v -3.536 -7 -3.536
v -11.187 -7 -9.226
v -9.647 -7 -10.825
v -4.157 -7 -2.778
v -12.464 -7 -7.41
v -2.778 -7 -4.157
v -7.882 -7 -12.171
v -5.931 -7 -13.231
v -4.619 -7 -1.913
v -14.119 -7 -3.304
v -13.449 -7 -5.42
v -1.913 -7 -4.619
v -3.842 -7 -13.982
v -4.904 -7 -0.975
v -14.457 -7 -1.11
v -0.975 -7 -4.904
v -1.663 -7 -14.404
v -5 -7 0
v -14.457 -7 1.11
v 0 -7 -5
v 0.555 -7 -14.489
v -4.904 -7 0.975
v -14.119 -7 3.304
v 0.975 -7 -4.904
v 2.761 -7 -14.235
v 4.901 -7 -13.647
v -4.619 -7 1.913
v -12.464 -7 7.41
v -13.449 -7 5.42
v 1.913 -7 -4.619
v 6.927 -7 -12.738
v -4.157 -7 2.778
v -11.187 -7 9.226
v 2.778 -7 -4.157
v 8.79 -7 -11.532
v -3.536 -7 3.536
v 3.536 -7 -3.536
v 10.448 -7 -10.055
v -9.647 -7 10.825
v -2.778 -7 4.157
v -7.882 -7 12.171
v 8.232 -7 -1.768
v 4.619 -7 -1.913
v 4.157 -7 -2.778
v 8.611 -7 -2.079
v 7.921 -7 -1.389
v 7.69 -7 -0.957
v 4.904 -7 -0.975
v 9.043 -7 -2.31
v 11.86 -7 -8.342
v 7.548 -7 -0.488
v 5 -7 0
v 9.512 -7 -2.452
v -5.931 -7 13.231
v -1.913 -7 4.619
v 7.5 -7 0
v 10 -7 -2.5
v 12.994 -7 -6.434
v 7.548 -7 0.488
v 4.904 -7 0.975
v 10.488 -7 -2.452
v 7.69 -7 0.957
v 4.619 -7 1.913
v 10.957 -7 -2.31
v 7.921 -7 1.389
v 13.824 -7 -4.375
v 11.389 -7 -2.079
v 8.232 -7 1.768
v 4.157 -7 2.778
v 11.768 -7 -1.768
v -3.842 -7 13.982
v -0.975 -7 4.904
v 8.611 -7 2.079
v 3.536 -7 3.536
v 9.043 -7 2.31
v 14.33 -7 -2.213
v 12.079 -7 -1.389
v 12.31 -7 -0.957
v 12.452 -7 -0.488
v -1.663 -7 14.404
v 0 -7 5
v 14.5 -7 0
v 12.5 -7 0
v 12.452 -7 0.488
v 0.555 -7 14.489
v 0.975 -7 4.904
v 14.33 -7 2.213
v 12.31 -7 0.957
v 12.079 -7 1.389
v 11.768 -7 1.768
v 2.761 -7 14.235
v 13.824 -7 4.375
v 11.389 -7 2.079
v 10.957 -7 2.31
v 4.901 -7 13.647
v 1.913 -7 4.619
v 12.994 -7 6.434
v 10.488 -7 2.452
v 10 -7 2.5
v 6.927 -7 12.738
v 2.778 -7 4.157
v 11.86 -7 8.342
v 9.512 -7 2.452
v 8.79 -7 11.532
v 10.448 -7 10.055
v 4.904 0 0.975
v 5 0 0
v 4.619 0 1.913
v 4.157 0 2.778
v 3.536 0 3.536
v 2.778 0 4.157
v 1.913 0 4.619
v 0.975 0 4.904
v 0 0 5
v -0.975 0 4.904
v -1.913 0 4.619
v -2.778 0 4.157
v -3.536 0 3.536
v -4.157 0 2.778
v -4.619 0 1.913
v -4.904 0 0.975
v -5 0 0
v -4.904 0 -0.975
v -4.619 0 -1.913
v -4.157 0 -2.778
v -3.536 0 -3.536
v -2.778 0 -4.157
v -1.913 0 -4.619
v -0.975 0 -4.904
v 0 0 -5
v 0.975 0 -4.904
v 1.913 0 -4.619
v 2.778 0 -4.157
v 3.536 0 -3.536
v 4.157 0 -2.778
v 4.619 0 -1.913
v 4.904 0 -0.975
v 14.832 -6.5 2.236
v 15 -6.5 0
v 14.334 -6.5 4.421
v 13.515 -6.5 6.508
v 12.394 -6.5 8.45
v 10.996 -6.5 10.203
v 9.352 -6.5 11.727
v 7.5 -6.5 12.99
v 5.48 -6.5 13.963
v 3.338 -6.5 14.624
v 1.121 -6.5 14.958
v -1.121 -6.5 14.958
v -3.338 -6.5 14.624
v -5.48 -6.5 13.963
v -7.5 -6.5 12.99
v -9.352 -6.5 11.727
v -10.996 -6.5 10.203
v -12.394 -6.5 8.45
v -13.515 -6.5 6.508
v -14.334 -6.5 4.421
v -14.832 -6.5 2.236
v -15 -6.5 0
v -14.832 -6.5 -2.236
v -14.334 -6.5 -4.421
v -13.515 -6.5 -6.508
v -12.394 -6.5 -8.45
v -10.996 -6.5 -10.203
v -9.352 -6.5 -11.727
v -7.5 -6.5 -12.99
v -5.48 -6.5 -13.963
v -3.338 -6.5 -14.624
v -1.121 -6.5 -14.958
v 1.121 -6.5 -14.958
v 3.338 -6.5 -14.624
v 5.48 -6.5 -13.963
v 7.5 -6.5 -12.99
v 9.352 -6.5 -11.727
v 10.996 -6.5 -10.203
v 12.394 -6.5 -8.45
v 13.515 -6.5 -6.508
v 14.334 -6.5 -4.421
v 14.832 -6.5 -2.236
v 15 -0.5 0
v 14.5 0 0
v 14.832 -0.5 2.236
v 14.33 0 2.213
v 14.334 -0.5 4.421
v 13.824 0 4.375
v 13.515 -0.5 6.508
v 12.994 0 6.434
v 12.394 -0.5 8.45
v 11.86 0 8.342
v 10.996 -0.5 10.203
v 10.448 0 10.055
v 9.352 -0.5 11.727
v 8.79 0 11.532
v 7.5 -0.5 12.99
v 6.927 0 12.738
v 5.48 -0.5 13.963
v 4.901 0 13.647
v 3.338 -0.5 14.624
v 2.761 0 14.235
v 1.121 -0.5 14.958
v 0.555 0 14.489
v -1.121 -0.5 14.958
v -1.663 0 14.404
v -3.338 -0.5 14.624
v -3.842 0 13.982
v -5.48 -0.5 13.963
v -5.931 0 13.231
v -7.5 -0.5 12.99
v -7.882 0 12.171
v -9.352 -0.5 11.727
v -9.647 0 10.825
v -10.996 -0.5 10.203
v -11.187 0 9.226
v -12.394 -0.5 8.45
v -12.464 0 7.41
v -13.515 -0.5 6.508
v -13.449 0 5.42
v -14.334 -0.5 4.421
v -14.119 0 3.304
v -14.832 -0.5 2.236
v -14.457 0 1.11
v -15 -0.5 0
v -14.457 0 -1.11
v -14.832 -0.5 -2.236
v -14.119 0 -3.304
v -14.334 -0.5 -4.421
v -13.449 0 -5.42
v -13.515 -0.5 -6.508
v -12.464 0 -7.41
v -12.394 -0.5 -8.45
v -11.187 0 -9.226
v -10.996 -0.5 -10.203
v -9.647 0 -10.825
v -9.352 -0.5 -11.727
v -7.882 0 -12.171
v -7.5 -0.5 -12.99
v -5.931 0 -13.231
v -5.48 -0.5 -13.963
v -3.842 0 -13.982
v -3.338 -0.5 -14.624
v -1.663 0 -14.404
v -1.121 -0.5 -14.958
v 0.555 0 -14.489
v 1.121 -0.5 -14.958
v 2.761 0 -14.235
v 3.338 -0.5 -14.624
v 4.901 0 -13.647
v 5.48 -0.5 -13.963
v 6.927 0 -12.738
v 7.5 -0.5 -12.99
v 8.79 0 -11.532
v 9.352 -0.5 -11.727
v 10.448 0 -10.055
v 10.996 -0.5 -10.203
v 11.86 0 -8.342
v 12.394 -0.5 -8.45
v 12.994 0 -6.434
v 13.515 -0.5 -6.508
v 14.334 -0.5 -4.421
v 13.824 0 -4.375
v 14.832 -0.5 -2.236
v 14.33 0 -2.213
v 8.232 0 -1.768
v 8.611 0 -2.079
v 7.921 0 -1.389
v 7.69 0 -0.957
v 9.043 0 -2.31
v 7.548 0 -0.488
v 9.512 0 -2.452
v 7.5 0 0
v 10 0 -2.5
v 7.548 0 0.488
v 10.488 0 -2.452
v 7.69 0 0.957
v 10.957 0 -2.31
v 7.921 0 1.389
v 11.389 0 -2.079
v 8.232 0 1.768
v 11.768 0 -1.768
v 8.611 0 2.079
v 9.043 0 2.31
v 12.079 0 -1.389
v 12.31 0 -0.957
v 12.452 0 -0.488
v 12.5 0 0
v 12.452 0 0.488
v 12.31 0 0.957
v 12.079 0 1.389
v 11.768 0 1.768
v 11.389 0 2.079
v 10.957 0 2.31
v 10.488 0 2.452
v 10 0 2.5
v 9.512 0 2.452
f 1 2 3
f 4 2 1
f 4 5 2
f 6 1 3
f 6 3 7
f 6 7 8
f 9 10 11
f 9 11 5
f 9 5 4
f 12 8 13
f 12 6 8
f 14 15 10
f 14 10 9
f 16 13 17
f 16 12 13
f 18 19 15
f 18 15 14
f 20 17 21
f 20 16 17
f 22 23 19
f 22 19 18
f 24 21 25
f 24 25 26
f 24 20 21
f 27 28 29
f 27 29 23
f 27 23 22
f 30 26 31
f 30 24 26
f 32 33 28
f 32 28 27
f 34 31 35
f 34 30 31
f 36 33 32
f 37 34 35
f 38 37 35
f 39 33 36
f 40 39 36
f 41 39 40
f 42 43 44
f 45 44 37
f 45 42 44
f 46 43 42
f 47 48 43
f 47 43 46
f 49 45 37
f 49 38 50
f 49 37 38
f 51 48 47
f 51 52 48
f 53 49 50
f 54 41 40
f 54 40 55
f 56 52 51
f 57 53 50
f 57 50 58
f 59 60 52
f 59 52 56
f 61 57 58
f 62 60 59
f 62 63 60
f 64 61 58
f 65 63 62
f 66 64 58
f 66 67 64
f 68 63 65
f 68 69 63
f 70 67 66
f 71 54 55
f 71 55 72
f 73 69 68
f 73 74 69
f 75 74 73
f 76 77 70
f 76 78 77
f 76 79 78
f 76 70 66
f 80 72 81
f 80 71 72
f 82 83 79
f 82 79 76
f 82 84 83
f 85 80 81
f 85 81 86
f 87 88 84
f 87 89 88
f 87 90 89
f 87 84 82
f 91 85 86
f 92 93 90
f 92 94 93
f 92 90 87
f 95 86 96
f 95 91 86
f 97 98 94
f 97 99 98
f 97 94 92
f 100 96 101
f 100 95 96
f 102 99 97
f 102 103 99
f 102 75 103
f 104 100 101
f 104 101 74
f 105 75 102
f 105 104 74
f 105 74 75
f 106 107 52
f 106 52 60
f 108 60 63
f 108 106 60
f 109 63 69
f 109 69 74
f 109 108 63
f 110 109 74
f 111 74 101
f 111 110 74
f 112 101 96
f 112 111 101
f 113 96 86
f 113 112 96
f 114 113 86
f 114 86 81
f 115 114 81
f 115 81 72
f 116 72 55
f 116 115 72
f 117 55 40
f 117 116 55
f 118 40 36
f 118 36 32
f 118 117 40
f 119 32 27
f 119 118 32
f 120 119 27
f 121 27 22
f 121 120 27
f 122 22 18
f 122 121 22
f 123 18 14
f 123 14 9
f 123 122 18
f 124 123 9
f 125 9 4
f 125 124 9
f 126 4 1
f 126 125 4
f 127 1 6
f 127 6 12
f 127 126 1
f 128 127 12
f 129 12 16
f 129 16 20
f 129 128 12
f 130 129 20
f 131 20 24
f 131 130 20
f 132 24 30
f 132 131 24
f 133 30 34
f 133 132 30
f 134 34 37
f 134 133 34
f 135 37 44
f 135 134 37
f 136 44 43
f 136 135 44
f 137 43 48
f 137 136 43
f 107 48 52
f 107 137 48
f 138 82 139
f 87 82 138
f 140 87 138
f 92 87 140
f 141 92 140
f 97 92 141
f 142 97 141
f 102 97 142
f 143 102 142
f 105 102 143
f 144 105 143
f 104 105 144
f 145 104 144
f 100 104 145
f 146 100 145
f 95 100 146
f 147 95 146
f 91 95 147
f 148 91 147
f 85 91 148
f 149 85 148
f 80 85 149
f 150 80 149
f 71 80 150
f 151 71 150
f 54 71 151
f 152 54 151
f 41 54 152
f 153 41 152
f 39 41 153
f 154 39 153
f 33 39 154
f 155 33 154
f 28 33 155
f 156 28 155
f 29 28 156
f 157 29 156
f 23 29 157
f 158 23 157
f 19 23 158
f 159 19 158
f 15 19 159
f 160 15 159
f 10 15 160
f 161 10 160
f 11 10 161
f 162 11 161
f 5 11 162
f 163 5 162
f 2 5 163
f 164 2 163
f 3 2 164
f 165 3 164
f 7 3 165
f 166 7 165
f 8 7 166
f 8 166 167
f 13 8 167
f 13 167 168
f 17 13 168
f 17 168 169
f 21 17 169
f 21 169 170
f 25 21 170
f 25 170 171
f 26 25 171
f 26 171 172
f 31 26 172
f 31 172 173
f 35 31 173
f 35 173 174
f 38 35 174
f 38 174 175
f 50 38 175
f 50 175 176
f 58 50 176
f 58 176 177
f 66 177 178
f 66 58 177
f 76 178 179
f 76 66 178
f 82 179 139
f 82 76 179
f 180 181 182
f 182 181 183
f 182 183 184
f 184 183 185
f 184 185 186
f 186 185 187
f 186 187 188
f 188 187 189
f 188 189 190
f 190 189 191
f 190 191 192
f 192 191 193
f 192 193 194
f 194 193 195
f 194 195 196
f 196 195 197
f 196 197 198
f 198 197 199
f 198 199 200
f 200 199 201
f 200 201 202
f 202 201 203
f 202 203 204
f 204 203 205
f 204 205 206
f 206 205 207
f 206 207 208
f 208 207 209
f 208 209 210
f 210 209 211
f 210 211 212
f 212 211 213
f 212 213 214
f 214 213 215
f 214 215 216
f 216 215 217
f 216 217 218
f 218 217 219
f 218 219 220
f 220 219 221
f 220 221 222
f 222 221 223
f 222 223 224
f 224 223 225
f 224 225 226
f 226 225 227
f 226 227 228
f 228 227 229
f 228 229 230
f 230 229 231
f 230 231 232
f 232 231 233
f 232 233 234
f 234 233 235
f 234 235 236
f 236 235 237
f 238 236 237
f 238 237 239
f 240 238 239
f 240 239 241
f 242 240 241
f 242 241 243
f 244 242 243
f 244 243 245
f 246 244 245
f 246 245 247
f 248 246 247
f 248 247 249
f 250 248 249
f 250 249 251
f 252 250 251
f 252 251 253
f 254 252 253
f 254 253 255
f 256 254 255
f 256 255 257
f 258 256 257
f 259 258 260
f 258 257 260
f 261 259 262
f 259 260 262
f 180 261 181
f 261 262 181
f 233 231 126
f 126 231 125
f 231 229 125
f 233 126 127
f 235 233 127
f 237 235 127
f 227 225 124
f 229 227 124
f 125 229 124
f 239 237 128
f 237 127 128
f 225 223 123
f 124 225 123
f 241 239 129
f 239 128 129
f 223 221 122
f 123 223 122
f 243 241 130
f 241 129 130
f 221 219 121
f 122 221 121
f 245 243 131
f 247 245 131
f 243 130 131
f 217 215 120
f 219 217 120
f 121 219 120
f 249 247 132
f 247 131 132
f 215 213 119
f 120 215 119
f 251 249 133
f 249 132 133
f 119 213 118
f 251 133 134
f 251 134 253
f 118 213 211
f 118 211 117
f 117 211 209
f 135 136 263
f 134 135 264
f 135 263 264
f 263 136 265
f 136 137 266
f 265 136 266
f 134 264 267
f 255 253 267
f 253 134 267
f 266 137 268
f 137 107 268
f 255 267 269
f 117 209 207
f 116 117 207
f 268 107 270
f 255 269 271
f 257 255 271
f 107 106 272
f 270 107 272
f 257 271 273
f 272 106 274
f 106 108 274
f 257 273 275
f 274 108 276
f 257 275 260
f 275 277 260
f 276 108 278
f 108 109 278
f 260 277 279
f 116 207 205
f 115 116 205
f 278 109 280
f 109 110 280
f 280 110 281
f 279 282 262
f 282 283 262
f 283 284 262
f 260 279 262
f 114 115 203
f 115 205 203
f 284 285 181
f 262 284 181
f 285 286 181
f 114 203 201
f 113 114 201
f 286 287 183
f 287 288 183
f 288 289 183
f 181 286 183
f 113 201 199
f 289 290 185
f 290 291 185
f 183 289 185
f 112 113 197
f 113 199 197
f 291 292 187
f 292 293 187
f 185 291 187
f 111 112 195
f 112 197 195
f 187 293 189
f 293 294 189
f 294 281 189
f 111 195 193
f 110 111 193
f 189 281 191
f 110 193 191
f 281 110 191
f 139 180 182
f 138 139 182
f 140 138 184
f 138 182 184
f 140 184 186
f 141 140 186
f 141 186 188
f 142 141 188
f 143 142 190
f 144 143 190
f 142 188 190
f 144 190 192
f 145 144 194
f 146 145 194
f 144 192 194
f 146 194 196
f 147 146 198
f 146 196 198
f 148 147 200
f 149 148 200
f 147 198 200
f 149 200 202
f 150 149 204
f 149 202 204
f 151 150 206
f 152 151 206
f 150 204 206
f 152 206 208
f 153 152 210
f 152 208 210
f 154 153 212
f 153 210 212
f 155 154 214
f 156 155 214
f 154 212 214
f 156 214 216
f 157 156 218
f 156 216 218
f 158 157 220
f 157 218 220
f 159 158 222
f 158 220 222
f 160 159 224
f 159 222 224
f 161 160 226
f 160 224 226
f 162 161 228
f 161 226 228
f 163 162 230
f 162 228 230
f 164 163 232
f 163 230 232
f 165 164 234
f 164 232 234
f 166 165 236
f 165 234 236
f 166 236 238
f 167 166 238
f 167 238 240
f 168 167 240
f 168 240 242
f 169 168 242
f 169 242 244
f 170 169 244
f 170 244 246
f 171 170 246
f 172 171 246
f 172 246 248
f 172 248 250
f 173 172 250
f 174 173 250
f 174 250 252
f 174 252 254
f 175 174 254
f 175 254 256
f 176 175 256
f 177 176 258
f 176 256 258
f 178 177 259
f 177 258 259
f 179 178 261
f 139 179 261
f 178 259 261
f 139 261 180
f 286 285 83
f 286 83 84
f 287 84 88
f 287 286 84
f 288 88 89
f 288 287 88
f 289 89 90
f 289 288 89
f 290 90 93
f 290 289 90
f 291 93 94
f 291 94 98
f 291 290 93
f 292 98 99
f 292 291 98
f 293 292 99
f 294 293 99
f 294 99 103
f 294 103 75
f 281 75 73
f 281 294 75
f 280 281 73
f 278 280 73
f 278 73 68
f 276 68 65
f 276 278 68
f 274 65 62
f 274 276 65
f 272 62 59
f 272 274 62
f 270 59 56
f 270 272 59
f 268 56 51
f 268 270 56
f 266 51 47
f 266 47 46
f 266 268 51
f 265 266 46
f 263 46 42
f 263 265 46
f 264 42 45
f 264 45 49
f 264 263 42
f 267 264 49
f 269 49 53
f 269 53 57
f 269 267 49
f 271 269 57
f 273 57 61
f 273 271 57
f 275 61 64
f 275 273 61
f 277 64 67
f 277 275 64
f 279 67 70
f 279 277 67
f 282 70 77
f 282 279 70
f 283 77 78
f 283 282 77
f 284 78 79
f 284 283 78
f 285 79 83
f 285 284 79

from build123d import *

# Parameters (mm, degrees)
F0_R     = 15
F0_R_2   = 5
F0_R_3   = 2.5
F1_DEPTH = 7
F2_SIZE  = 0.5
F3_SIZE  = 0.5


with BuildPart() as f1:
    # F0 (on Front) → F1 (new body)
    with BuildSketch(Plane.XZ):
        Circle(F0_R)
        Circle(F0_R_2, mode=Mode.SUBTRACT)
        with Locations((10, 0)):
            Circle(F0_R_3, mode=Mode.SUBTRACT)
    extrude(amount=F1_DEPTH)

    # F2
    f2_edges = [f1.edges().sort_by_distance(p)[0] for p in [
        (-15, -7, 0),
    ]]
    chamfer(f2_edges, length=F2_SIZE)

    # F3
    f3_edges = [f1.edges().sort_by_distance(p)[0] for p in [
        (-15, 0, 0),
    ]]
    chamfer(f3_edges, length=F3_SIZE)


solid = f1.part
